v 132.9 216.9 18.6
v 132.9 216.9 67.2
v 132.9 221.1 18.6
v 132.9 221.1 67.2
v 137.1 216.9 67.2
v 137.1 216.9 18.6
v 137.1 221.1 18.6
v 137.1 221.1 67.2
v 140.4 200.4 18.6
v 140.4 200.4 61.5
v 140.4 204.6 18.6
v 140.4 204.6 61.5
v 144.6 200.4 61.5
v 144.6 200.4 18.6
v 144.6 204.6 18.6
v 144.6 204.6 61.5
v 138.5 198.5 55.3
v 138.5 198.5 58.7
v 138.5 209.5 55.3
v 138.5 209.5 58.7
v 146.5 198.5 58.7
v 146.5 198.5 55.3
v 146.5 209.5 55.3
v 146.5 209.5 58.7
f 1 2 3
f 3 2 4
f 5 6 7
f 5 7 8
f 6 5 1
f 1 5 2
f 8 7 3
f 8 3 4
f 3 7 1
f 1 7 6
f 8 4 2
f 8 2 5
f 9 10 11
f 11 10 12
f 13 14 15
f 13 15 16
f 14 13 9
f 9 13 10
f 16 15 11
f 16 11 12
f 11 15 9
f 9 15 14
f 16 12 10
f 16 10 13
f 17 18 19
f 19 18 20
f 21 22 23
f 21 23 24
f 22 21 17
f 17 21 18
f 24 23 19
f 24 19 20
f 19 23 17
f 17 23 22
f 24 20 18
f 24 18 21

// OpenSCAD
// Generated by the canonical parent Python sources and validated exchange pipeline.
polyhedron(points=[[132.89999389648438, 216.89999389648438, 18.600000381469727], [132.89999389648438, 216.89999389648438, 67.19999694824219], [132.89999389648438, 221.10000610351562, 18.600000381469727], [132.89999389648438, 221.10000610351562, 67.19999694824219], [137.10000610351562, 216.89999389648438, 67.19999694824219], [137.10000610351562, 216.89999389648438, 18.600000381469727], [137.10000610351562, 221.10000610351562, 18.600000381469727], [137.10000610351562, 221.10000610351562, 67.19999694824219], [140.39999389648438, 200.39999389648438, 18.600000381469727], [140.39999389648438, 200.39999389648438, 61.5], [140.39999389648438, 204.60000610351562, 18.600000381469727], [140.39999389648438, 204.60000610351562, 61.5], [144.60000610351562, 200.39999389648438, 61.5], [144.60000610351562, 200.39999389648438, 18.600000381469727], [144.60000610351562, 204.60000610351562, 18.600000381469727], [144.60000610351562, 204.60000610351562, 61.5], [138.5, 198.5, 55.29999923706055], [138.5, 198.5, 58.70000076293945], [138.5, 209.5, 55.29999923706055], [138.5, 209.5, 58.70000076293945], [146.5, 198.5, 58.70000076293945], [146.5, 198.5, 55.29999923706055], [146.5, 209.5, 55.29999923706055], [146.5, 209.5, 58.70000076293945]],faces=[[2, 1, 0], [3, 1, 2], [6, 5, 4], [7, 6, 4], [0, 4, 5], [1, 4, 0], [2, 6, 7], [3, 2, 7], [0, 6, 2], [5, 6, 0], [1, 3, 7], [4, 1, 7], [10, 9, 8], [11, 9, 10], [14, 13, 12], [15, 14, 12], [8, 12, 13], [9, 12, 8], [10, 14, 15], [11, 10, 15], [8, 14, 10], [13, 14, 8], [9, 11, 15], [12, 9, 15], [18, 17, 16], [19, 17, 18], [22, 21, 20], [23, 22, 20], [16, 20, 21], [17, 20, 16], [18, 22, 23], [19, 18, 23], [16, 22, 18], [21, 22, 16], [17, 19, 23], [20, 17, 23]],convexity=10);
